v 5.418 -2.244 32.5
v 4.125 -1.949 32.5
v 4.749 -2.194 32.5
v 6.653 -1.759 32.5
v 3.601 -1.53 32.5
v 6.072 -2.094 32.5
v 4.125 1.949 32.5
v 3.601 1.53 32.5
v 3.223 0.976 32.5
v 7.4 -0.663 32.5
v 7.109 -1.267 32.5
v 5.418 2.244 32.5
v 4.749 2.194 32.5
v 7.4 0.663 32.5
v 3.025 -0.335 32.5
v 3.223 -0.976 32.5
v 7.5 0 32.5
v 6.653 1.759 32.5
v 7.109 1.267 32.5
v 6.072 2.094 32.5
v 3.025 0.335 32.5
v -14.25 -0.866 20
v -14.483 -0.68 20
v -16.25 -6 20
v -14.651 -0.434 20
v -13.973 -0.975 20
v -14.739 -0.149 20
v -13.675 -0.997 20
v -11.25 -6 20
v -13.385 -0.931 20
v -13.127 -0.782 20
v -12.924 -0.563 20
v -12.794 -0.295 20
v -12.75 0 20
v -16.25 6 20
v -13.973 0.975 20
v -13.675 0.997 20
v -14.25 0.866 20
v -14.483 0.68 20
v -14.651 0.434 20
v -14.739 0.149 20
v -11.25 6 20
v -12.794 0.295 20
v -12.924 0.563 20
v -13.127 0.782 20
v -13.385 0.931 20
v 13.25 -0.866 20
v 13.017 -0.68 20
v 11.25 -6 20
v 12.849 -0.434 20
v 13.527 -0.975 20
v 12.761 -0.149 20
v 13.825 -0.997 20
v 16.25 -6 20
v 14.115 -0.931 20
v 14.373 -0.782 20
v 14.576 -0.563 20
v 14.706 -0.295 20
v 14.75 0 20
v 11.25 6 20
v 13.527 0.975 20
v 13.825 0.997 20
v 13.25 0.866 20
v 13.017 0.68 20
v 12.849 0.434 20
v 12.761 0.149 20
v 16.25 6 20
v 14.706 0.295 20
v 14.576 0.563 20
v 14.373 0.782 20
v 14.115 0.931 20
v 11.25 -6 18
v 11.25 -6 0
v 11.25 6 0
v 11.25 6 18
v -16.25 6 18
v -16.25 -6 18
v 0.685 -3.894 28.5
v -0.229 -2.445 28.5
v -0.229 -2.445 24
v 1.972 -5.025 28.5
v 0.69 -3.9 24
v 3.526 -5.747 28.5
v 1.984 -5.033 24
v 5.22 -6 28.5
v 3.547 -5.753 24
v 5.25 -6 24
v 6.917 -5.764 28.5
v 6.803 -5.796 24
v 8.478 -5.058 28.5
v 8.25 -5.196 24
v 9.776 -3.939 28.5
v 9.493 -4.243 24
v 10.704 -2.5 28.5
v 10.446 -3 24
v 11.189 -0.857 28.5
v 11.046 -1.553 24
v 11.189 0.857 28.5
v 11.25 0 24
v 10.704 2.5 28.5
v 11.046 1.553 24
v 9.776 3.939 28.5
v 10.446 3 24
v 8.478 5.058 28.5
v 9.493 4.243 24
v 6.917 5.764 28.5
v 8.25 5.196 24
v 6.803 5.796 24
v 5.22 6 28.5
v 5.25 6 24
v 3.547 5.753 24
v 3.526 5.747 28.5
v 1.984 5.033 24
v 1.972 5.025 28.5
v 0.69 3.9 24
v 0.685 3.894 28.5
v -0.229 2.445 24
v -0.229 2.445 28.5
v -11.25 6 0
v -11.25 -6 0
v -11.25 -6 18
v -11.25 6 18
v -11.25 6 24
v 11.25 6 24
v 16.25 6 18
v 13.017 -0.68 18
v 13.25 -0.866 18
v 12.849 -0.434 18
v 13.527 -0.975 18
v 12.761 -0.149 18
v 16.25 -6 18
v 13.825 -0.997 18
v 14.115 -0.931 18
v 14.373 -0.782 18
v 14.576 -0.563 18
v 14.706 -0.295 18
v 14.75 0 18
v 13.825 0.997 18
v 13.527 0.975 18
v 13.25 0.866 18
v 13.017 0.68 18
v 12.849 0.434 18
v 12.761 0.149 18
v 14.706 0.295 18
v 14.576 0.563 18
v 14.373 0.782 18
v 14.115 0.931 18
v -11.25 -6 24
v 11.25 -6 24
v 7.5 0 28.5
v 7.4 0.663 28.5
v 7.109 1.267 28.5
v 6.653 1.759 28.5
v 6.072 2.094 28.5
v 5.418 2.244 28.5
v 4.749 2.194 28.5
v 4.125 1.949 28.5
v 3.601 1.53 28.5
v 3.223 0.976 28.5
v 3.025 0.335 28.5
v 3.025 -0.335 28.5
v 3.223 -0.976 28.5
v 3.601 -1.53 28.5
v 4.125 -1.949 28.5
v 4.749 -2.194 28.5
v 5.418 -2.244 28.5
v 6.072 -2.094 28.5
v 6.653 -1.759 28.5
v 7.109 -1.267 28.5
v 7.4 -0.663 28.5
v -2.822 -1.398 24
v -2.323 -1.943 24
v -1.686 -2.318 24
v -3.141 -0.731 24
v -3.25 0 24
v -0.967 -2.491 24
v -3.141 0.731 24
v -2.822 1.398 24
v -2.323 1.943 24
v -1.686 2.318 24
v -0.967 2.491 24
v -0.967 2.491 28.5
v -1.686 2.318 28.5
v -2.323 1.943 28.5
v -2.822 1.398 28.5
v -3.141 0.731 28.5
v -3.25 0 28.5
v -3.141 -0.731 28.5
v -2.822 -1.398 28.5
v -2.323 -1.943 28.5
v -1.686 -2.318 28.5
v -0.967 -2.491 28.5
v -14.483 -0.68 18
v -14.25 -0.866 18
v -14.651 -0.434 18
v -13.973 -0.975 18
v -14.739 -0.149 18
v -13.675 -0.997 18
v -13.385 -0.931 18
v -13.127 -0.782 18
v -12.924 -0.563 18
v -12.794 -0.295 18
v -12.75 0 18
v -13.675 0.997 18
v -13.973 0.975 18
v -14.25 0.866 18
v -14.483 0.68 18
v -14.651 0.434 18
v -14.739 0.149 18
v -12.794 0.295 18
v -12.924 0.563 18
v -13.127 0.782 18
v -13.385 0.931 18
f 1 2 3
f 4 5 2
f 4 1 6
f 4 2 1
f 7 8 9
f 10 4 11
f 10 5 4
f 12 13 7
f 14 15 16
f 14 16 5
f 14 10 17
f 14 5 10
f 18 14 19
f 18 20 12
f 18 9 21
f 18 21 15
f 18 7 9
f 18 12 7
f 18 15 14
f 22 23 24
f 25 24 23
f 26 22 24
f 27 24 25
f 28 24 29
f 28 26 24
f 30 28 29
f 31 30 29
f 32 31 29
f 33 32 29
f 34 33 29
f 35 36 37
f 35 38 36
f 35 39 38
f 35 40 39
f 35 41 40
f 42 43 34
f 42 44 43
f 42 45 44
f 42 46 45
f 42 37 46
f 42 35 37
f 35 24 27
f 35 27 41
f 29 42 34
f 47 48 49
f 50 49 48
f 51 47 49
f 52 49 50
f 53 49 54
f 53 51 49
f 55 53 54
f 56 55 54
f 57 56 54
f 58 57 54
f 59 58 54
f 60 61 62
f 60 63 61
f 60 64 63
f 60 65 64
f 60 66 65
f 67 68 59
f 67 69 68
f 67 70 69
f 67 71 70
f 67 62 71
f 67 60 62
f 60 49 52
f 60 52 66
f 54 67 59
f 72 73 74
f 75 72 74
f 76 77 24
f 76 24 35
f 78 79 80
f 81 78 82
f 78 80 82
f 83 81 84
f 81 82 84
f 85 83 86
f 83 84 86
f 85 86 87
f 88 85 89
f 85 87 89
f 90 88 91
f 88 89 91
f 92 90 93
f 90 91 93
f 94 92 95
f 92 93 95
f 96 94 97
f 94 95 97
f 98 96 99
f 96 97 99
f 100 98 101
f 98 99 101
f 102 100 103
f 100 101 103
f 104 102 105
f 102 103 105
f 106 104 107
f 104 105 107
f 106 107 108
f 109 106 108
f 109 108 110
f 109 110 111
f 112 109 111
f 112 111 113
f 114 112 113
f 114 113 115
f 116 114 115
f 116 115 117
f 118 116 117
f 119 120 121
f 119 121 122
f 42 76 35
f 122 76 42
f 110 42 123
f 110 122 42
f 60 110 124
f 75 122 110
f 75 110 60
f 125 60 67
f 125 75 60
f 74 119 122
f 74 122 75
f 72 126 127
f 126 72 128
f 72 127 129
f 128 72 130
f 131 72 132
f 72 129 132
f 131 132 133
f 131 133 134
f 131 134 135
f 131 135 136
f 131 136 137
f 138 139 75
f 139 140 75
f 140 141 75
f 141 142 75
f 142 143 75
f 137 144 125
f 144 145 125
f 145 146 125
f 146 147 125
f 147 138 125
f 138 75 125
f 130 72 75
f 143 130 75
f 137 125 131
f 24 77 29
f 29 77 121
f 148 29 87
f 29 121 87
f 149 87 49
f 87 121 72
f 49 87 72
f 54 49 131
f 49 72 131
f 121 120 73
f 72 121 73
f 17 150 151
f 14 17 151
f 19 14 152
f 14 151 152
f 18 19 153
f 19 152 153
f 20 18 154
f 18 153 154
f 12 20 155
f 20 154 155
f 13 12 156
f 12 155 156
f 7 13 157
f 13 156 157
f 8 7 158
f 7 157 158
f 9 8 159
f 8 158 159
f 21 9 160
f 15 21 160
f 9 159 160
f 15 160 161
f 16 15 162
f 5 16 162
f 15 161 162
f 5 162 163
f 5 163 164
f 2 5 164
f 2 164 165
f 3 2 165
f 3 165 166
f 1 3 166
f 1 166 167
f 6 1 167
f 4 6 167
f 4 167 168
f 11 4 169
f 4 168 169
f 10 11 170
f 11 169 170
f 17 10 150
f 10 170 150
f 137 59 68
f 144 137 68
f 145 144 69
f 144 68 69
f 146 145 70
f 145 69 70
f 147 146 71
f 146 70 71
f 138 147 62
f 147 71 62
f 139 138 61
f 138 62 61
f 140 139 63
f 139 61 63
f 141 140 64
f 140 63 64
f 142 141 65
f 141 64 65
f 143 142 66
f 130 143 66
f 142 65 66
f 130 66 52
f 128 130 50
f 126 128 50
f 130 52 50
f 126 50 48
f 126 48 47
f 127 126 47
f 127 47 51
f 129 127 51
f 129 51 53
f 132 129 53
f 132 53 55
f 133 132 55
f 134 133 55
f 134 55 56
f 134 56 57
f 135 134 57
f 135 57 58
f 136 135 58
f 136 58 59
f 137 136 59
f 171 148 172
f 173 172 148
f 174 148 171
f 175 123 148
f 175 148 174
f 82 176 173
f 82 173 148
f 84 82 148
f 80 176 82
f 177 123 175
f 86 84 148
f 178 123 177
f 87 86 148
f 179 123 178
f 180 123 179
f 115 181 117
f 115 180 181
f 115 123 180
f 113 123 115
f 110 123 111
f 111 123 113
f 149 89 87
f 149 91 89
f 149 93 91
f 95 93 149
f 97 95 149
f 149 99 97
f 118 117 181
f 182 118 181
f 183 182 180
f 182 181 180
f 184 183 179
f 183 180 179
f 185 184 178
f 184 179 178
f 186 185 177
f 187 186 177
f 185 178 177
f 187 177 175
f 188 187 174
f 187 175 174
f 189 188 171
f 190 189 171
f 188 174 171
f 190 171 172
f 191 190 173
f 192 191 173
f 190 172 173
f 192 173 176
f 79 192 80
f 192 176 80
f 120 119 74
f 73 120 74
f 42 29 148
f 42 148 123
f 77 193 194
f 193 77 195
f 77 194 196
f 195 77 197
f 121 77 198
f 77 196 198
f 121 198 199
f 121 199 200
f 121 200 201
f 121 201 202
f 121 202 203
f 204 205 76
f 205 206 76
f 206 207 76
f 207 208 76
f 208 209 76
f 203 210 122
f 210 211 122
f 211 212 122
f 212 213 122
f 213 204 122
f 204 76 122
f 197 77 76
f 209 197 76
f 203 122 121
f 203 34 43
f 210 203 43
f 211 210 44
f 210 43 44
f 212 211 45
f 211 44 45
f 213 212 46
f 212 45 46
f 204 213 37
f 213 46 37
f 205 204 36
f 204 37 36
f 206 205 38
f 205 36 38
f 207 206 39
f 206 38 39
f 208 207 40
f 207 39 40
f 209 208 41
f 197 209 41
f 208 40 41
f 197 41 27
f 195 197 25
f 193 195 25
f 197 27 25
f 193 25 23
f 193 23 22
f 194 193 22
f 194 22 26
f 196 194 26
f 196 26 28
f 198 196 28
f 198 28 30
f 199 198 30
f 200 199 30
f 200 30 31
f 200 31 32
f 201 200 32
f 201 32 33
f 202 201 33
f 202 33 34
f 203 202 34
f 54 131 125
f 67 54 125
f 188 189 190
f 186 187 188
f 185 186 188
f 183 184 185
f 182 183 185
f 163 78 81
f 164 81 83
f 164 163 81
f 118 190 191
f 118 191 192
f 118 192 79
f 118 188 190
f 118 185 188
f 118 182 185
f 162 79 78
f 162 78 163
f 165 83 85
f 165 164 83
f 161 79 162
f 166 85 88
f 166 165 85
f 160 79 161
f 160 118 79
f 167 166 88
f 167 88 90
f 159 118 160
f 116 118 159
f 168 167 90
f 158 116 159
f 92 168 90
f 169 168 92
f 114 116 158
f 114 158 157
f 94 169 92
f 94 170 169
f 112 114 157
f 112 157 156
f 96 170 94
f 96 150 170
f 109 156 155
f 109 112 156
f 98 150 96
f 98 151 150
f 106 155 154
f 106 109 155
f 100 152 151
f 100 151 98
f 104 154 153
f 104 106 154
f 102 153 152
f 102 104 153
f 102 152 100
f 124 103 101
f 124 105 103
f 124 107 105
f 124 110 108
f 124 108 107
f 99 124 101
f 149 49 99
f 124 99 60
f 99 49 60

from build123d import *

# Parameters (mm, degrees)
SKETCH1_W      = 22.5
SKETCH1_H      = 12
EXTRUDE1_DEPTH = 18
SKETCH2_W      = 32.5
SKETCH2_H      = 12
EXTRUDE2_DEPTH = 2
SKETCH3_W      = 22.5
SKETCH3_H      = 12
EXTRUDE3_DEPTH = 4
SKETCH4_R      = 1
EXTRUDE4_DEPTH = 21
EXTRUDE5_DEPTH = 4.5
SKETCH6_R      = 2.25
EXTRUDE6_DEPTH = 4


with BuildPart() as part:
    # Sketch1 → Extrude1 (new body)
    with BuildSketch(Plane.XY):
        Rectangle(SKETCH1_W, SKETCH1_H)
    extrude(amount=EXTRUDE1_DEPTH)

    # Sketch2 → Extrude2 (add)
    with BuildSketch(Plane.XY.offset(18)):
        Rectangle(SKETCH2_W, SKETCH2_H)
    extrude(amount=EXTRUDE2_DEPTH)

    # Sketch3 → Extrude3 (add)
    with BuildSketch(Plane.XY.offset(20)):
        Rectangle(SKETCH3_W, SKETCH3_H)
    extrude(amount=EXTRUDE3_DEPTH)

    # Sketch4 → Extrude4 (cut, through all)
    with BuildSketch(Plane.XY.offset(20)):
        with Locations((-13.75, 0)):
            Circle(SKETCH4_R)
        with Locations((13.75, 0)):
            Circle(SKETCH4_R)
    extrude(amount=-EXTRUDE4_DEPTH, mode=Mode.SUBTRACT)

    # Sketch5 → Extrude5 (add)
    with BuildSketch(Plane.XY.offset(24)):
        with BuildLine():
            ThreePointArc((-0.229166667, -2.445144707), (11.25, 0), (-0.229166667, 2.445144707))
            ThreePointArc((-0.229166667, 2.445144707), (-3.25, 0), (-0.229166667, -2.445144707))
        make_face()
    extrude(amount=EXTRUDE5_DEPTH)

    # Sketch6 → Extrude6 (add)
    with BuildSketch(Plane.XY.offset(28.5)):
        with Locations((5.25, 0)):
            Circle(SKETCH6_R)
    extrude(amount=EXTRUDE6_DEPTH)


solid = part.part
